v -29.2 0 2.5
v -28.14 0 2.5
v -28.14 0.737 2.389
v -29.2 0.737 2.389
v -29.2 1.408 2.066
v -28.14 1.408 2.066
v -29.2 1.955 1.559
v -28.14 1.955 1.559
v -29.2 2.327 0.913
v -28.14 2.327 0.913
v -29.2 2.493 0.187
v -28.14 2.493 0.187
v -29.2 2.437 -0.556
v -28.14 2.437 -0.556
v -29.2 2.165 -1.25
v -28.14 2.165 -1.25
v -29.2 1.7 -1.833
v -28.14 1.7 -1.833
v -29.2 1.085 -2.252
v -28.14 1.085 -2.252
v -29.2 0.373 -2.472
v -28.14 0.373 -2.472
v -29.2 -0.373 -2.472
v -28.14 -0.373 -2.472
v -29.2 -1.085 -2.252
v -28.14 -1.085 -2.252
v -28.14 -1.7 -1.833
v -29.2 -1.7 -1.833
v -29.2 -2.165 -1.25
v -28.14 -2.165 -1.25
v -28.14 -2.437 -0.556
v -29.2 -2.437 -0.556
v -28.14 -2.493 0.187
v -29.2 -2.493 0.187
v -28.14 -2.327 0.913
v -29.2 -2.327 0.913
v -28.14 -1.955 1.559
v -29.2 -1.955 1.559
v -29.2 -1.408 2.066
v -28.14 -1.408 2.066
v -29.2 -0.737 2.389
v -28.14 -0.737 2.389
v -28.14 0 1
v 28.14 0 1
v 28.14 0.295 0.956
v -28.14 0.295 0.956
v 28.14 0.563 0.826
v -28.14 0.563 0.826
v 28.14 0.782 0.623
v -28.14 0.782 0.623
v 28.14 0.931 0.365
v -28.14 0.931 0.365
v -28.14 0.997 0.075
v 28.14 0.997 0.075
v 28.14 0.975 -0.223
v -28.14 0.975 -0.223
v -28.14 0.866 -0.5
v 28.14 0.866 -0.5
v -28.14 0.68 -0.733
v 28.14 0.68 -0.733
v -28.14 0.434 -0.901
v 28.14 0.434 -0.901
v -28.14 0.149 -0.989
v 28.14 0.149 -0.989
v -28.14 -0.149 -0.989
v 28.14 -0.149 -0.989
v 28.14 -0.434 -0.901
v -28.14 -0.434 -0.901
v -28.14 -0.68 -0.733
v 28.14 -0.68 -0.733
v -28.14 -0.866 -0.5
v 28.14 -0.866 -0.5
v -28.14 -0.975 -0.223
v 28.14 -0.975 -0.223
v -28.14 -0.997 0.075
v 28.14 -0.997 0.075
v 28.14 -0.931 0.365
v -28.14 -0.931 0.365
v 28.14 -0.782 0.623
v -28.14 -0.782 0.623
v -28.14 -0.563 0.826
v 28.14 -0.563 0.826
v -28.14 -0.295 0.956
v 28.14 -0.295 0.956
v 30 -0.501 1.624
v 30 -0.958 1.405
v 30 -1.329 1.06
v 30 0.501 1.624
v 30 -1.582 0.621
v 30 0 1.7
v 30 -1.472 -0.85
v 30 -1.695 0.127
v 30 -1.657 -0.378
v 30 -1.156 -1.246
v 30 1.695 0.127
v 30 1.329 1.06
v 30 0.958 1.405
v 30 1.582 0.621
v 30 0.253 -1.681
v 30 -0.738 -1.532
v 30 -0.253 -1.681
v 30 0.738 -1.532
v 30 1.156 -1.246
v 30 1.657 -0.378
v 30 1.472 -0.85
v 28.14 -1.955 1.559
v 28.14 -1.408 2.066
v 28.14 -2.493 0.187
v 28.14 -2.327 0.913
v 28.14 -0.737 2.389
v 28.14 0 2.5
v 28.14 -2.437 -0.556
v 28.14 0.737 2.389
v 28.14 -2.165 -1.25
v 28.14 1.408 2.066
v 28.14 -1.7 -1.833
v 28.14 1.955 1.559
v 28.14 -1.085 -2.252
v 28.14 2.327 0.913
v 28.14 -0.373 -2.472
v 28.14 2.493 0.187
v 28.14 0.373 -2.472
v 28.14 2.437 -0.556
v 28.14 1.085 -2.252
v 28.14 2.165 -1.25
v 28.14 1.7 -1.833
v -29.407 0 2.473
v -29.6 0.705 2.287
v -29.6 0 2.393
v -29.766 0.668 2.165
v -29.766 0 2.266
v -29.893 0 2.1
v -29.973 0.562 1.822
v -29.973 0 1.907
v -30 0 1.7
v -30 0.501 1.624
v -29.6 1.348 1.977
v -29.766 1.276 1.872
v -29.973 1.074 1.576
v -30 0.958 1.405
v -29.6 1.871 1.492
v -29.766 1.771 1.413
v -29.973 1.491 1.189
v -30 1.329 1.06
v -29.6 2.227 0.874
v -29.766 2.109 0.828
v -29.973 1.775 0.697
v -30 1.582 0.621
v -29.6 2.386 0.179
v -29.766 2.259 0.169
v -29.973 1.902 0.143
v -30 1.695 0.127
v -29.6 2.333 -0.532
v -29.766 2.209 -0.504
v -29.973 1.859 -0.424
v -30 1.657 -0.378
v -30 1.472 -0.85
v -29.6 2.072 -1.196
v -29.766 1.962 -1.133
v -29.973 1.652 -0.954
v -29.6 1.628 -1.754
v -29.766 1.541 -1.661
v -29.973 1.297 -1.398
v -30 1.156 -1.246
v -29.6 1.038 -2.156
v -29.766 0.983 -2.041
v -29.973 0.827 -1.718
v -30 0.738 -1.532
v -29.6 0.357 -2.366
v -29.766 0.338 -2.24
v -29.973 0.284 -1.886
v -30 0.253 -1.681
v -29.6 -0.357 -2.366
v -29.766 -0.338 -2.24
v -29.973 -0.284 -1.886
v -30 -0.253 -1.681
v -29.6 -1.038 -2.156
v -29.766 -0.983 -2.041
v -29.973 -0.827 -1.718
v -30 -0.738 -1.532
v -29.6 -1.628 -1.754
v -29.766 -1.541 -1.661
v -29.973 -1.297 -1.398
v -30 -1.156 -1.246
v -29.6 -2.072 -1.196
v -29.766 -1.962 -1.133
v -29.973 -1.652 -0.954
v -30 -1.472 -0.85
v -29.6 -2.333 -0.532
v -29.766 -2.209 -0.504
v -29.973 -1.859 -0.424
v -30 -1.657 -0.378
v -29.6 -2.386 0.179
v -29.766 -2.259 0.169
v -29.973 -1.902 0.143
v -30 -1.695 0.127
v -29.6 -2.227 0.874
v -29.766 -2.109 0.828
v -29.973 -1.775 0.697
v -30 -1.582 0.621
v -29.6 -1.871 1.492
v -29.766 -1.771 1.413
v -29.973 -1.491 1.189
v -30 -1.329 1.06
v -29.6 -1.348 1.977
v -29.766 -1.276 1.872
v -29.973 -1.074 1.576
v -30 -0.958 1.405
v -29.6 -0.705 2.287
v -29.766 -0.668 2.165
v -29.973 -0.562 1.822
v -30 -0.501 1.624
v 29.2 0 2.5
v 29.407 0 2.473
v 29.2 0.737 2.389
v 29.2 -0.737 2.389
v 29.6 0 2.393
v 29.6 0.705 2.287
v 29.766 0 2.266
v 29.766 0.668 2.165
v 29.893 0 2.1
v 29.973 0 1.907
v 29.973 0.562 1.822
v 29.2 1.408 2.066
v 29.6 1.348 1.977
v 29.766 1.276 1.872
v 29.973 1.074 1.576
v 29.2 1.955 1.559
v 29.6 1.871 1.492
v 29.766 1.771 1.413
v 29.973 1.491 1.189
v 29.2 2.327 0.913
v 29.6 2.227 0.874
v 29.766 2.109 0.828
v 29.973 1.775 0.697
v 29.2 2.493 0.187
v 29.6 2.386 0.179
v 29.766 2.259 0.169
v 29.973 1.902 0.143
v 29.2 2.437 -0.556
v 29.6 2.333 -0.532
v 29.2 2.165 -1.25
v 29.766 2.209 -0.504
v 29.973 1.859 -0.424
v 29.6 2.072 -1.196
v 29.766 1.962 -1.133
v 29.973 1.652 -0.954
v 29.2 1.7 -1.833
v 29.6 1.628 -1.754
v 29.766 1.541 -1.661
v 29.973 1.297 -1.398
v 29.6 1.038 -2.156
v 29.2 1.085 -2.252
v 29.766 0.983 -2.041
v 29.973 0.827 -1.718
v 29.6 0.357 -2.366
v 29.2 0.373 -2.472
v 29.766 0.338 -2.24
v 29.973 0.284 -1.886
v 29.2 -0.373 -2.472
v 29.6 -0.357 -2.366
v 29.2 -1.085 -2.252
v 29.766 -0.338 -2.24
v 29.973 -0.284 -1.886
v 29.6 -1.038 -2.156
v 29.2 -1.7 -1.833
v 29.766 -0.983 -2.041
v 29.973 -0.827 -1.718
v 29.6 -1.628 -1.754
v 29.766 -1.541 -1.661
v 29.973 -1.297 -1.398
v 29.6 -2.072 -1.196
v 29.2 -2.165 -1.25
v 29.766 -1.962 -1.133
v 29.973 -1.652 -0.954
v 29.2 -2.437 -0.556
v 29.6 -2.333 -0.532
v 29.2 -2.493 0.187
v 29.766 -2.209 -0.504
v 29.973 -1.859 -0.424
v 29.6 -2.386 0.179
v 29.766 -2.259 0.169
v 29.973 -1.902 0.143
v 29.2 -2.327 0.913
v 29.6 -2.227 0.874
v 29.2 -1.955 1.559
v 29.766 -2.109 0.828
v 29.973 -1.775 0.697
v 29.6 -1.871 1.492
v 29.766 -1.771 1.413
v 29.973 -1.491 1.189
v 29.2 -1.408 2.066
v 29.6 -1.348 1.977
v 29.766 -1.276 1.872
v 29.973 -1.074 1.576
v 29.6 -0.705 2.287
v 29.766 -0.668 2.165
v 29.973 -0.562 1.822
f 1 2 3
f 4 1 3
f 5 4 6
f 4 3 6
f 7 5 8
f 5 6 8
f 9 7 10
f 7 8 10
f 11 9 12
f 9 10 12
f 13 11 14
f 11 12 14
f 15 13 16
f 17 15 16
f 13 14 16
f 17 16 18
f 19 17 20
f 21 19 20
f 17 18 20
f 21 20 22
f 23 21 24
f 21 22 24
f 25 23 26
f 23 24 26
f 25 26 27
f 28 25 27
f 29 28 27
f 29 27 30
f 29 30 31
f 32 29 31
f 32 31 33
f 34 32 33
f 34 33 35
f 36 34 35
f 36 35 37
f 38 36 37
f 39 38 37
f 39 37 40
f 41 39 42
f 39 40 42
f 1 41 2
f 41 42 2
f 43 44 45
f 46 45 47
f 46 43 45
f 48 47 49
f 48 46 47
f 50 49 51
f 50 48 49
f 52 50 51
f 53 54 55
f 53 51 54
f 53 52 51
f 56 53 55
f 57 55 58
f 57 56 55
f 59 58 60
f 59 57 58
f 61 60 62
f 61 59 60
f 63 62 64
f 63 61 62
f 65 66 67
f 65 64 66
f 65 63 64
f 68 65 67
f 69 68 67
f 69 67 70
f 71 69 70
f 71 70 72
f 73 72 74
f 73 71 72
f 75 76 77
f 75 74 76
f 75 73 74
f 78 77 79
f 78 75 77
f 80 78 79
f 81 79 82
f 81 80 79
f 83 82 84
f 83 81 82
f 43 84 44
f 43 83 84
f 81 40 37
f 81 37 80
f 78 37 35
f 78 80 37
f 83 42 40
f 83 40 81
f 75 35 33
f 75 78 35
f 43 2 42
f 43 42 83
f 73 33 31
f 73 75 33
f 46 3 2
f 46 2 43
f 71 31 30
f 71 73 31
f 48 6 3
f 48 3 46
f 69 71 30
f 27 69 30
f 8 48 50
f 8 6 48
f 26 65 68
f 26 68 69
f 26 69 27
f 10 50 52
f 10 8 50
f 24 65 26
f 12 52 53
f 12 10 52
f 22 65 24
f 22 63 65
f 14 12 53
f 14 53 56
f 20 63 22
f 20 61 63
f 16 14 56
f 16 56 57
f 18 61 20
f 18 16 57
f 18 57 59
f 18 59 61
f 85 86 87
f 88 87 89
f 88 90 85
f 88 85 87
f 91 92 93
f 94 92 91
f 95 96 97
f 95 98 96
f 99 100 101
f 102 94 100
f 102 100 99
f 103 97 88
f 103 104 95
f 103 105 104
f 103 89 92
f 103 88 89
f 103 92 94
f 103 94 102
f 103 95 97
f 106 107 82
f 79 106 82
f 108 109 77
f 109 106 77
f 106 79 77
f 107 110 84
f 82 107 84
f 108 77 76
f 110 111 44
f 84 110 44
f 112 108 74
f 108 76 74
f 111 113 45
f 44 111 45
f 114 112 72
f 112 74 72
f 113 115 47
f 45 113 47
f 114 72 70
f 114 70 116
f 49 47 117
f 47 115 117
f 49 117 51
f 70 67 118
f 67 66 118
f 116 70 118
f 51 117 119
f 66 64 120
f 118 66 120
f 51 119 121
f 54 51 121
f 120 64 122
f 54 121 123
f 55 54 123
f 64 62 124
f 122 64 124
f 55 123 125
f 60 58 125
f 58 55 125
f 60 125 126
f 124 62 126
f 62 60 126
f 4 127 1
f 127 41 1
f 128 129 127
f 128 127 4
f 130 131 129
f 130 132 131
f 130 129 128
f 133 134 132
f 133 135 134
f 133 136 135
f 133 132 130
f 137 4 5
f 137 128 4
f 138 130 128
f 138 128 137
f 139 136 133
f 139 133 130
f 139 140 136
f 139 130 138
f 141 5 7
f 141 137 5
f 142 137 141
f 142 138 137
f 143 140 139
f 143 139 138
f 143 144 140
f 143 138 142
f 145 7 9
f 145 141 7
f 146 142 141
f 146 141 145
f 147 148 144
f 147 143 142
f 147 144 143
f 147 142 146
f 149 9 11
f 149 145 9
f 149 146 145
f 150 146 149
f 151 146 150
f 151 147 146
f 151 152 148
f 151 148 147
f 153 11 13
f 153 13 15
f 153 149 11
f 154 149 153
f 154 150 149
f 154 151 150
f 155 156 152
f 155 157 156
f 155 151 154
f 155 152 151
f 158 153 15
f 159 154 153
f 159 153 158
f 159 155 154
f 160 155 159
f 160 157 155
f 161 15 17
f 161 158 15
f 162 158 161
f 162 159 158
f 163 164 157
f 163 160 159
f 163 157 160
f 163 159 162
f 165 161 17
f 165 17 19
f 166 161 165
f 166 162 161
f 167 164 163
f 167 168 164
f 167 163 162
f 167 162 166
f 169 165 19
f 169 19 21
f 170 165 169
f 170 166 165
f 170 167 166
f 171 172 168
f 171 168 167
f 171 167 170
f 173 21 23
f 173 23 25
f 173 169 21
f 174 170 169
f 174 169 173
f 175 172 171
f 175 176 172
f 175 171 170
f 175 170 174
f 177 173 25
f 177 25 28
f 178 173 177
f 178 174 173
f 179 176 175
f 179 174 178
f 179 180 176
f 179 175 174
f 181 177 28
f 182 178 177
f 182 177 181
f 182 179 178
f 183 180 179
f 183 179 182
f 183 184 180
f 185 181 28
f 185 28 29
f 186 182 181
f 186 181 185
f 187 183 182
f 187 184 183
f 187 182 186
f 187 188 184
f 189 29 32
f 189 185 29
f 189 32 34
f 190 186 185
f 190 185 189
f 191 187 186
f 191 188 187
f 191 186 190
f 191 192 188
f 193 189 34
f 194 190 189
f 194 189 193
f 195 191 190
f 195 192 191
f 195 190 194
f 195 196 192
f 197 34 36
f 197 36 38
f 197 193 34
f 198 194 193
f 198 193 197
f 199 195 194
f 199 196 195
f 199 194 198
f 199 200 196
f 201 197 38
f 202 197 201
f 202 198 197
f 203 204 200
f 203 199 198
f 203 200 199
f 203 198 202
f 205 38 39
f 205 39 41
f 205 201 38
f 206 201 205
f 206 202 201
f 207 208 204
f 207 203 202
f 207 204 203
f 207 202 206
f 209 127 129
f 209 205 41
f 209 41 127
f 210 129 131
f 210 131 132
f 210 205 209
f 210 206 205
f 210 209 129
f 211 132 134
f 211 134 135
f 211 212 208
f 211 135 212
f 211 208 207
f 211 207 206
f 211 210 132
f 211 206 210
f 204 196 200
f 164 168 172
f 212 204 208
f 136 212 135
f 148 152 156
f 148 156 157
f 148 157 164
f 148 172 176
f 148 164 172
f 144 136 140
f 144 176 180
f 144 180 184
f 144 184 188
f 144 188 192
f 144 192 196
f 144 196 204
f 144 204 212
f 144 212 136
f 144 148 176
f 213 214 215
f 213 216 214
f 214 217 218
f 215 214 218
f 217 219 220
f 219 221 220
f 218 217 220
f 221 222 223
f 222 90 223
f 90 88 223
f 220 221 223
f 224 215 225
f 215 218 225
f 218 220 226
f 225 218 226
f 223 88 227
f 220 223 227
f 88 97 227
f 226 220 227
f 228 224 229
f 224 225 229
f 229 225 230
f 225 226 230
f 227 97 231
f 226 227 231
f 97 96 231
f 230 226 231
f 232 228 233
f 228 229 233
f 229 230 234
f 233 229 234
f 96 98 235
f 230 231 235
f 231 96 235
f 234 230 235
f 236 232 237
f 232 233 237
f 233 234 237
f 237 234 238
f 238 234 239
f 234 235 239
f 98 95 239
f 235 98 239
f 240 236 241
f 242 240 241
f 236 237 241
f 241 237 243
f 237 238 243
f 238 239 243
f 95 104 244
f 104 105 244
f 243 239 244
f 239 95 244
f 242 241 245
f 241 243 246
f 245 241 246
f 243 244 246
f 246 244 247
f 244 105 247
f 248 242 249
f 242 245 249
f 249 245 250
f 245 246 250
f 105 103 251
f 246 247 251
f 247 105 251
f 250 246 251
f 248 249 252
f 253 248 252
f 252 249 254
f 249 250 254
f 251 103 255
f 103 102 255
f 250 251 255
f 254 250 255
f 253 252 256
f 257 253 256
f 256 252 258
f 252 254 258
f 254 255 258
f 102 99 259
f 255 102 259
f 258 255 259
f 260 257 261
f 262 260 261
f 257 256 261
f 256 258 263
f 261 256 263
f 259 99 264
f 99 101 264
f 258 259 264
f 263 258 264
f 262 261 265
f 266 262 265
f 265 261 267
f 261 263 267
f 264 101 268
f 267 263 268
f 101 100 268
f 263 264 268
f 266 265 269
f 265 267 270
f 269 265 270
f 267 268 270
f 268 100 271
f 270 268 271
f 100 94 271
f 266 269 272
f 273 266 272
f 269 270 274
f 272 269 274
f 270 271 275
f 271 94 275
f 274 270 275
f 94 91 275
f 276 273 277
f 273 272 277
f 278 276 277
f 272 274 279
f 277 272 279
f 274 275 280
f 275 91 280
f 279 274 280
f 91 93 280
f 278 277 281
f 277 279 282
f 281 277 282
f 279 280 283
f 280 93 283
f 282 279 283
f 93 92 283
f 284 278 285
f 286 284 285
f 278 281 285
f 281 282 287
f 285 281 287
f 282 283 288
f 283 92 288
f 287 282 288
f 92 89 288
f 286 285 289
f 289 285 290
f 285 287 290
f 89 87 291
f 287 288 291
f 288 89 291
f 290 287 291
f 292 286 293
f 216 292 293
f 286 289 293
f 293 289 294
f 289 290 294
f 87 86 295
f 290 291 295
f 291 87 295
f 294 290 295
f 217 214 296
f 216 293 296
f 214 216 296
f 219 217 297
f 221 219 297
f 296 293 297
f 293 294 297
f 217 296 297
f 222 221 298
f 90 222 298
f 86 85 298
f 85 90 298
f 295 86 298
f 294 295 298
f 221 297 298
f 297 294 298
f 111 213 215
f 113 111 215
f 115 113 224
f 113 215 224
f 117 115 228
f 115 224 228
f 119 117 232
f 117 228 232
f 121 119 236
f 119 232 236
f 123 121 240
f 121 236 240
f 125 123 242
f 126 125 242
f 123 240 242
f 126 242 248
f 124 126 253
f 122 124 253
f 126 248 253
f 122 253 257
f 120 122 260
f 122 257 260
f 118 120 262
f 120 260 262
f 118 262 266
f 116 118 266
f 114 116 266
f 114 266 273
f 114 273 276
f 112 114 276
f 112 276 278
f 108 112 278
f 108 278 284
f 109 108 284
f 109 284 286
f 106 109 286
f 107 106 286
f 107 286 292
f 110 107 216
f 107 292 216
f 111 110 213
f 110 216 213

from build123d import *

# Parameters (mm, degrees)
F0_W   = 1.85994
F0_H   = 1
F0_H_2 = 1.5
F2_R   = 0.8


with BuildPart() as f1:
    # F0 (on Front) → F1 (revolve)
    with BuildSketch(Plane.XZ):
        Polygon((-28.14006, 0), (0, 0), (28.14006, 0), (28.14006, 1), (-28.14006, 1), align=None)
        with Locations((29.07003, -0.5)):
            Rectangle(F0_W, F0_H)
        with Locations((-29.07003, 0.5)):
            Rectangle(F0_W, F0_H)
        with Locations((29.07003, 1.75)):
            Rectangle(F0_W, F0_H_2)
        with Locations((-29.07003, 1.75)):
            Rectangle(F0_W, F0_H_2)
    revolve(axis=Axis((0, 0, 0), (-1, 0, 0)))

    # F2
    f2_edges = [f1.edges().sort_by_distance(p)[0] for p in [
        (-30, 0, -2.5),
        (30, 0, -2.5),
    ]]
    fillet(f2_edges, radius=F2_R)


solid = f1.part
